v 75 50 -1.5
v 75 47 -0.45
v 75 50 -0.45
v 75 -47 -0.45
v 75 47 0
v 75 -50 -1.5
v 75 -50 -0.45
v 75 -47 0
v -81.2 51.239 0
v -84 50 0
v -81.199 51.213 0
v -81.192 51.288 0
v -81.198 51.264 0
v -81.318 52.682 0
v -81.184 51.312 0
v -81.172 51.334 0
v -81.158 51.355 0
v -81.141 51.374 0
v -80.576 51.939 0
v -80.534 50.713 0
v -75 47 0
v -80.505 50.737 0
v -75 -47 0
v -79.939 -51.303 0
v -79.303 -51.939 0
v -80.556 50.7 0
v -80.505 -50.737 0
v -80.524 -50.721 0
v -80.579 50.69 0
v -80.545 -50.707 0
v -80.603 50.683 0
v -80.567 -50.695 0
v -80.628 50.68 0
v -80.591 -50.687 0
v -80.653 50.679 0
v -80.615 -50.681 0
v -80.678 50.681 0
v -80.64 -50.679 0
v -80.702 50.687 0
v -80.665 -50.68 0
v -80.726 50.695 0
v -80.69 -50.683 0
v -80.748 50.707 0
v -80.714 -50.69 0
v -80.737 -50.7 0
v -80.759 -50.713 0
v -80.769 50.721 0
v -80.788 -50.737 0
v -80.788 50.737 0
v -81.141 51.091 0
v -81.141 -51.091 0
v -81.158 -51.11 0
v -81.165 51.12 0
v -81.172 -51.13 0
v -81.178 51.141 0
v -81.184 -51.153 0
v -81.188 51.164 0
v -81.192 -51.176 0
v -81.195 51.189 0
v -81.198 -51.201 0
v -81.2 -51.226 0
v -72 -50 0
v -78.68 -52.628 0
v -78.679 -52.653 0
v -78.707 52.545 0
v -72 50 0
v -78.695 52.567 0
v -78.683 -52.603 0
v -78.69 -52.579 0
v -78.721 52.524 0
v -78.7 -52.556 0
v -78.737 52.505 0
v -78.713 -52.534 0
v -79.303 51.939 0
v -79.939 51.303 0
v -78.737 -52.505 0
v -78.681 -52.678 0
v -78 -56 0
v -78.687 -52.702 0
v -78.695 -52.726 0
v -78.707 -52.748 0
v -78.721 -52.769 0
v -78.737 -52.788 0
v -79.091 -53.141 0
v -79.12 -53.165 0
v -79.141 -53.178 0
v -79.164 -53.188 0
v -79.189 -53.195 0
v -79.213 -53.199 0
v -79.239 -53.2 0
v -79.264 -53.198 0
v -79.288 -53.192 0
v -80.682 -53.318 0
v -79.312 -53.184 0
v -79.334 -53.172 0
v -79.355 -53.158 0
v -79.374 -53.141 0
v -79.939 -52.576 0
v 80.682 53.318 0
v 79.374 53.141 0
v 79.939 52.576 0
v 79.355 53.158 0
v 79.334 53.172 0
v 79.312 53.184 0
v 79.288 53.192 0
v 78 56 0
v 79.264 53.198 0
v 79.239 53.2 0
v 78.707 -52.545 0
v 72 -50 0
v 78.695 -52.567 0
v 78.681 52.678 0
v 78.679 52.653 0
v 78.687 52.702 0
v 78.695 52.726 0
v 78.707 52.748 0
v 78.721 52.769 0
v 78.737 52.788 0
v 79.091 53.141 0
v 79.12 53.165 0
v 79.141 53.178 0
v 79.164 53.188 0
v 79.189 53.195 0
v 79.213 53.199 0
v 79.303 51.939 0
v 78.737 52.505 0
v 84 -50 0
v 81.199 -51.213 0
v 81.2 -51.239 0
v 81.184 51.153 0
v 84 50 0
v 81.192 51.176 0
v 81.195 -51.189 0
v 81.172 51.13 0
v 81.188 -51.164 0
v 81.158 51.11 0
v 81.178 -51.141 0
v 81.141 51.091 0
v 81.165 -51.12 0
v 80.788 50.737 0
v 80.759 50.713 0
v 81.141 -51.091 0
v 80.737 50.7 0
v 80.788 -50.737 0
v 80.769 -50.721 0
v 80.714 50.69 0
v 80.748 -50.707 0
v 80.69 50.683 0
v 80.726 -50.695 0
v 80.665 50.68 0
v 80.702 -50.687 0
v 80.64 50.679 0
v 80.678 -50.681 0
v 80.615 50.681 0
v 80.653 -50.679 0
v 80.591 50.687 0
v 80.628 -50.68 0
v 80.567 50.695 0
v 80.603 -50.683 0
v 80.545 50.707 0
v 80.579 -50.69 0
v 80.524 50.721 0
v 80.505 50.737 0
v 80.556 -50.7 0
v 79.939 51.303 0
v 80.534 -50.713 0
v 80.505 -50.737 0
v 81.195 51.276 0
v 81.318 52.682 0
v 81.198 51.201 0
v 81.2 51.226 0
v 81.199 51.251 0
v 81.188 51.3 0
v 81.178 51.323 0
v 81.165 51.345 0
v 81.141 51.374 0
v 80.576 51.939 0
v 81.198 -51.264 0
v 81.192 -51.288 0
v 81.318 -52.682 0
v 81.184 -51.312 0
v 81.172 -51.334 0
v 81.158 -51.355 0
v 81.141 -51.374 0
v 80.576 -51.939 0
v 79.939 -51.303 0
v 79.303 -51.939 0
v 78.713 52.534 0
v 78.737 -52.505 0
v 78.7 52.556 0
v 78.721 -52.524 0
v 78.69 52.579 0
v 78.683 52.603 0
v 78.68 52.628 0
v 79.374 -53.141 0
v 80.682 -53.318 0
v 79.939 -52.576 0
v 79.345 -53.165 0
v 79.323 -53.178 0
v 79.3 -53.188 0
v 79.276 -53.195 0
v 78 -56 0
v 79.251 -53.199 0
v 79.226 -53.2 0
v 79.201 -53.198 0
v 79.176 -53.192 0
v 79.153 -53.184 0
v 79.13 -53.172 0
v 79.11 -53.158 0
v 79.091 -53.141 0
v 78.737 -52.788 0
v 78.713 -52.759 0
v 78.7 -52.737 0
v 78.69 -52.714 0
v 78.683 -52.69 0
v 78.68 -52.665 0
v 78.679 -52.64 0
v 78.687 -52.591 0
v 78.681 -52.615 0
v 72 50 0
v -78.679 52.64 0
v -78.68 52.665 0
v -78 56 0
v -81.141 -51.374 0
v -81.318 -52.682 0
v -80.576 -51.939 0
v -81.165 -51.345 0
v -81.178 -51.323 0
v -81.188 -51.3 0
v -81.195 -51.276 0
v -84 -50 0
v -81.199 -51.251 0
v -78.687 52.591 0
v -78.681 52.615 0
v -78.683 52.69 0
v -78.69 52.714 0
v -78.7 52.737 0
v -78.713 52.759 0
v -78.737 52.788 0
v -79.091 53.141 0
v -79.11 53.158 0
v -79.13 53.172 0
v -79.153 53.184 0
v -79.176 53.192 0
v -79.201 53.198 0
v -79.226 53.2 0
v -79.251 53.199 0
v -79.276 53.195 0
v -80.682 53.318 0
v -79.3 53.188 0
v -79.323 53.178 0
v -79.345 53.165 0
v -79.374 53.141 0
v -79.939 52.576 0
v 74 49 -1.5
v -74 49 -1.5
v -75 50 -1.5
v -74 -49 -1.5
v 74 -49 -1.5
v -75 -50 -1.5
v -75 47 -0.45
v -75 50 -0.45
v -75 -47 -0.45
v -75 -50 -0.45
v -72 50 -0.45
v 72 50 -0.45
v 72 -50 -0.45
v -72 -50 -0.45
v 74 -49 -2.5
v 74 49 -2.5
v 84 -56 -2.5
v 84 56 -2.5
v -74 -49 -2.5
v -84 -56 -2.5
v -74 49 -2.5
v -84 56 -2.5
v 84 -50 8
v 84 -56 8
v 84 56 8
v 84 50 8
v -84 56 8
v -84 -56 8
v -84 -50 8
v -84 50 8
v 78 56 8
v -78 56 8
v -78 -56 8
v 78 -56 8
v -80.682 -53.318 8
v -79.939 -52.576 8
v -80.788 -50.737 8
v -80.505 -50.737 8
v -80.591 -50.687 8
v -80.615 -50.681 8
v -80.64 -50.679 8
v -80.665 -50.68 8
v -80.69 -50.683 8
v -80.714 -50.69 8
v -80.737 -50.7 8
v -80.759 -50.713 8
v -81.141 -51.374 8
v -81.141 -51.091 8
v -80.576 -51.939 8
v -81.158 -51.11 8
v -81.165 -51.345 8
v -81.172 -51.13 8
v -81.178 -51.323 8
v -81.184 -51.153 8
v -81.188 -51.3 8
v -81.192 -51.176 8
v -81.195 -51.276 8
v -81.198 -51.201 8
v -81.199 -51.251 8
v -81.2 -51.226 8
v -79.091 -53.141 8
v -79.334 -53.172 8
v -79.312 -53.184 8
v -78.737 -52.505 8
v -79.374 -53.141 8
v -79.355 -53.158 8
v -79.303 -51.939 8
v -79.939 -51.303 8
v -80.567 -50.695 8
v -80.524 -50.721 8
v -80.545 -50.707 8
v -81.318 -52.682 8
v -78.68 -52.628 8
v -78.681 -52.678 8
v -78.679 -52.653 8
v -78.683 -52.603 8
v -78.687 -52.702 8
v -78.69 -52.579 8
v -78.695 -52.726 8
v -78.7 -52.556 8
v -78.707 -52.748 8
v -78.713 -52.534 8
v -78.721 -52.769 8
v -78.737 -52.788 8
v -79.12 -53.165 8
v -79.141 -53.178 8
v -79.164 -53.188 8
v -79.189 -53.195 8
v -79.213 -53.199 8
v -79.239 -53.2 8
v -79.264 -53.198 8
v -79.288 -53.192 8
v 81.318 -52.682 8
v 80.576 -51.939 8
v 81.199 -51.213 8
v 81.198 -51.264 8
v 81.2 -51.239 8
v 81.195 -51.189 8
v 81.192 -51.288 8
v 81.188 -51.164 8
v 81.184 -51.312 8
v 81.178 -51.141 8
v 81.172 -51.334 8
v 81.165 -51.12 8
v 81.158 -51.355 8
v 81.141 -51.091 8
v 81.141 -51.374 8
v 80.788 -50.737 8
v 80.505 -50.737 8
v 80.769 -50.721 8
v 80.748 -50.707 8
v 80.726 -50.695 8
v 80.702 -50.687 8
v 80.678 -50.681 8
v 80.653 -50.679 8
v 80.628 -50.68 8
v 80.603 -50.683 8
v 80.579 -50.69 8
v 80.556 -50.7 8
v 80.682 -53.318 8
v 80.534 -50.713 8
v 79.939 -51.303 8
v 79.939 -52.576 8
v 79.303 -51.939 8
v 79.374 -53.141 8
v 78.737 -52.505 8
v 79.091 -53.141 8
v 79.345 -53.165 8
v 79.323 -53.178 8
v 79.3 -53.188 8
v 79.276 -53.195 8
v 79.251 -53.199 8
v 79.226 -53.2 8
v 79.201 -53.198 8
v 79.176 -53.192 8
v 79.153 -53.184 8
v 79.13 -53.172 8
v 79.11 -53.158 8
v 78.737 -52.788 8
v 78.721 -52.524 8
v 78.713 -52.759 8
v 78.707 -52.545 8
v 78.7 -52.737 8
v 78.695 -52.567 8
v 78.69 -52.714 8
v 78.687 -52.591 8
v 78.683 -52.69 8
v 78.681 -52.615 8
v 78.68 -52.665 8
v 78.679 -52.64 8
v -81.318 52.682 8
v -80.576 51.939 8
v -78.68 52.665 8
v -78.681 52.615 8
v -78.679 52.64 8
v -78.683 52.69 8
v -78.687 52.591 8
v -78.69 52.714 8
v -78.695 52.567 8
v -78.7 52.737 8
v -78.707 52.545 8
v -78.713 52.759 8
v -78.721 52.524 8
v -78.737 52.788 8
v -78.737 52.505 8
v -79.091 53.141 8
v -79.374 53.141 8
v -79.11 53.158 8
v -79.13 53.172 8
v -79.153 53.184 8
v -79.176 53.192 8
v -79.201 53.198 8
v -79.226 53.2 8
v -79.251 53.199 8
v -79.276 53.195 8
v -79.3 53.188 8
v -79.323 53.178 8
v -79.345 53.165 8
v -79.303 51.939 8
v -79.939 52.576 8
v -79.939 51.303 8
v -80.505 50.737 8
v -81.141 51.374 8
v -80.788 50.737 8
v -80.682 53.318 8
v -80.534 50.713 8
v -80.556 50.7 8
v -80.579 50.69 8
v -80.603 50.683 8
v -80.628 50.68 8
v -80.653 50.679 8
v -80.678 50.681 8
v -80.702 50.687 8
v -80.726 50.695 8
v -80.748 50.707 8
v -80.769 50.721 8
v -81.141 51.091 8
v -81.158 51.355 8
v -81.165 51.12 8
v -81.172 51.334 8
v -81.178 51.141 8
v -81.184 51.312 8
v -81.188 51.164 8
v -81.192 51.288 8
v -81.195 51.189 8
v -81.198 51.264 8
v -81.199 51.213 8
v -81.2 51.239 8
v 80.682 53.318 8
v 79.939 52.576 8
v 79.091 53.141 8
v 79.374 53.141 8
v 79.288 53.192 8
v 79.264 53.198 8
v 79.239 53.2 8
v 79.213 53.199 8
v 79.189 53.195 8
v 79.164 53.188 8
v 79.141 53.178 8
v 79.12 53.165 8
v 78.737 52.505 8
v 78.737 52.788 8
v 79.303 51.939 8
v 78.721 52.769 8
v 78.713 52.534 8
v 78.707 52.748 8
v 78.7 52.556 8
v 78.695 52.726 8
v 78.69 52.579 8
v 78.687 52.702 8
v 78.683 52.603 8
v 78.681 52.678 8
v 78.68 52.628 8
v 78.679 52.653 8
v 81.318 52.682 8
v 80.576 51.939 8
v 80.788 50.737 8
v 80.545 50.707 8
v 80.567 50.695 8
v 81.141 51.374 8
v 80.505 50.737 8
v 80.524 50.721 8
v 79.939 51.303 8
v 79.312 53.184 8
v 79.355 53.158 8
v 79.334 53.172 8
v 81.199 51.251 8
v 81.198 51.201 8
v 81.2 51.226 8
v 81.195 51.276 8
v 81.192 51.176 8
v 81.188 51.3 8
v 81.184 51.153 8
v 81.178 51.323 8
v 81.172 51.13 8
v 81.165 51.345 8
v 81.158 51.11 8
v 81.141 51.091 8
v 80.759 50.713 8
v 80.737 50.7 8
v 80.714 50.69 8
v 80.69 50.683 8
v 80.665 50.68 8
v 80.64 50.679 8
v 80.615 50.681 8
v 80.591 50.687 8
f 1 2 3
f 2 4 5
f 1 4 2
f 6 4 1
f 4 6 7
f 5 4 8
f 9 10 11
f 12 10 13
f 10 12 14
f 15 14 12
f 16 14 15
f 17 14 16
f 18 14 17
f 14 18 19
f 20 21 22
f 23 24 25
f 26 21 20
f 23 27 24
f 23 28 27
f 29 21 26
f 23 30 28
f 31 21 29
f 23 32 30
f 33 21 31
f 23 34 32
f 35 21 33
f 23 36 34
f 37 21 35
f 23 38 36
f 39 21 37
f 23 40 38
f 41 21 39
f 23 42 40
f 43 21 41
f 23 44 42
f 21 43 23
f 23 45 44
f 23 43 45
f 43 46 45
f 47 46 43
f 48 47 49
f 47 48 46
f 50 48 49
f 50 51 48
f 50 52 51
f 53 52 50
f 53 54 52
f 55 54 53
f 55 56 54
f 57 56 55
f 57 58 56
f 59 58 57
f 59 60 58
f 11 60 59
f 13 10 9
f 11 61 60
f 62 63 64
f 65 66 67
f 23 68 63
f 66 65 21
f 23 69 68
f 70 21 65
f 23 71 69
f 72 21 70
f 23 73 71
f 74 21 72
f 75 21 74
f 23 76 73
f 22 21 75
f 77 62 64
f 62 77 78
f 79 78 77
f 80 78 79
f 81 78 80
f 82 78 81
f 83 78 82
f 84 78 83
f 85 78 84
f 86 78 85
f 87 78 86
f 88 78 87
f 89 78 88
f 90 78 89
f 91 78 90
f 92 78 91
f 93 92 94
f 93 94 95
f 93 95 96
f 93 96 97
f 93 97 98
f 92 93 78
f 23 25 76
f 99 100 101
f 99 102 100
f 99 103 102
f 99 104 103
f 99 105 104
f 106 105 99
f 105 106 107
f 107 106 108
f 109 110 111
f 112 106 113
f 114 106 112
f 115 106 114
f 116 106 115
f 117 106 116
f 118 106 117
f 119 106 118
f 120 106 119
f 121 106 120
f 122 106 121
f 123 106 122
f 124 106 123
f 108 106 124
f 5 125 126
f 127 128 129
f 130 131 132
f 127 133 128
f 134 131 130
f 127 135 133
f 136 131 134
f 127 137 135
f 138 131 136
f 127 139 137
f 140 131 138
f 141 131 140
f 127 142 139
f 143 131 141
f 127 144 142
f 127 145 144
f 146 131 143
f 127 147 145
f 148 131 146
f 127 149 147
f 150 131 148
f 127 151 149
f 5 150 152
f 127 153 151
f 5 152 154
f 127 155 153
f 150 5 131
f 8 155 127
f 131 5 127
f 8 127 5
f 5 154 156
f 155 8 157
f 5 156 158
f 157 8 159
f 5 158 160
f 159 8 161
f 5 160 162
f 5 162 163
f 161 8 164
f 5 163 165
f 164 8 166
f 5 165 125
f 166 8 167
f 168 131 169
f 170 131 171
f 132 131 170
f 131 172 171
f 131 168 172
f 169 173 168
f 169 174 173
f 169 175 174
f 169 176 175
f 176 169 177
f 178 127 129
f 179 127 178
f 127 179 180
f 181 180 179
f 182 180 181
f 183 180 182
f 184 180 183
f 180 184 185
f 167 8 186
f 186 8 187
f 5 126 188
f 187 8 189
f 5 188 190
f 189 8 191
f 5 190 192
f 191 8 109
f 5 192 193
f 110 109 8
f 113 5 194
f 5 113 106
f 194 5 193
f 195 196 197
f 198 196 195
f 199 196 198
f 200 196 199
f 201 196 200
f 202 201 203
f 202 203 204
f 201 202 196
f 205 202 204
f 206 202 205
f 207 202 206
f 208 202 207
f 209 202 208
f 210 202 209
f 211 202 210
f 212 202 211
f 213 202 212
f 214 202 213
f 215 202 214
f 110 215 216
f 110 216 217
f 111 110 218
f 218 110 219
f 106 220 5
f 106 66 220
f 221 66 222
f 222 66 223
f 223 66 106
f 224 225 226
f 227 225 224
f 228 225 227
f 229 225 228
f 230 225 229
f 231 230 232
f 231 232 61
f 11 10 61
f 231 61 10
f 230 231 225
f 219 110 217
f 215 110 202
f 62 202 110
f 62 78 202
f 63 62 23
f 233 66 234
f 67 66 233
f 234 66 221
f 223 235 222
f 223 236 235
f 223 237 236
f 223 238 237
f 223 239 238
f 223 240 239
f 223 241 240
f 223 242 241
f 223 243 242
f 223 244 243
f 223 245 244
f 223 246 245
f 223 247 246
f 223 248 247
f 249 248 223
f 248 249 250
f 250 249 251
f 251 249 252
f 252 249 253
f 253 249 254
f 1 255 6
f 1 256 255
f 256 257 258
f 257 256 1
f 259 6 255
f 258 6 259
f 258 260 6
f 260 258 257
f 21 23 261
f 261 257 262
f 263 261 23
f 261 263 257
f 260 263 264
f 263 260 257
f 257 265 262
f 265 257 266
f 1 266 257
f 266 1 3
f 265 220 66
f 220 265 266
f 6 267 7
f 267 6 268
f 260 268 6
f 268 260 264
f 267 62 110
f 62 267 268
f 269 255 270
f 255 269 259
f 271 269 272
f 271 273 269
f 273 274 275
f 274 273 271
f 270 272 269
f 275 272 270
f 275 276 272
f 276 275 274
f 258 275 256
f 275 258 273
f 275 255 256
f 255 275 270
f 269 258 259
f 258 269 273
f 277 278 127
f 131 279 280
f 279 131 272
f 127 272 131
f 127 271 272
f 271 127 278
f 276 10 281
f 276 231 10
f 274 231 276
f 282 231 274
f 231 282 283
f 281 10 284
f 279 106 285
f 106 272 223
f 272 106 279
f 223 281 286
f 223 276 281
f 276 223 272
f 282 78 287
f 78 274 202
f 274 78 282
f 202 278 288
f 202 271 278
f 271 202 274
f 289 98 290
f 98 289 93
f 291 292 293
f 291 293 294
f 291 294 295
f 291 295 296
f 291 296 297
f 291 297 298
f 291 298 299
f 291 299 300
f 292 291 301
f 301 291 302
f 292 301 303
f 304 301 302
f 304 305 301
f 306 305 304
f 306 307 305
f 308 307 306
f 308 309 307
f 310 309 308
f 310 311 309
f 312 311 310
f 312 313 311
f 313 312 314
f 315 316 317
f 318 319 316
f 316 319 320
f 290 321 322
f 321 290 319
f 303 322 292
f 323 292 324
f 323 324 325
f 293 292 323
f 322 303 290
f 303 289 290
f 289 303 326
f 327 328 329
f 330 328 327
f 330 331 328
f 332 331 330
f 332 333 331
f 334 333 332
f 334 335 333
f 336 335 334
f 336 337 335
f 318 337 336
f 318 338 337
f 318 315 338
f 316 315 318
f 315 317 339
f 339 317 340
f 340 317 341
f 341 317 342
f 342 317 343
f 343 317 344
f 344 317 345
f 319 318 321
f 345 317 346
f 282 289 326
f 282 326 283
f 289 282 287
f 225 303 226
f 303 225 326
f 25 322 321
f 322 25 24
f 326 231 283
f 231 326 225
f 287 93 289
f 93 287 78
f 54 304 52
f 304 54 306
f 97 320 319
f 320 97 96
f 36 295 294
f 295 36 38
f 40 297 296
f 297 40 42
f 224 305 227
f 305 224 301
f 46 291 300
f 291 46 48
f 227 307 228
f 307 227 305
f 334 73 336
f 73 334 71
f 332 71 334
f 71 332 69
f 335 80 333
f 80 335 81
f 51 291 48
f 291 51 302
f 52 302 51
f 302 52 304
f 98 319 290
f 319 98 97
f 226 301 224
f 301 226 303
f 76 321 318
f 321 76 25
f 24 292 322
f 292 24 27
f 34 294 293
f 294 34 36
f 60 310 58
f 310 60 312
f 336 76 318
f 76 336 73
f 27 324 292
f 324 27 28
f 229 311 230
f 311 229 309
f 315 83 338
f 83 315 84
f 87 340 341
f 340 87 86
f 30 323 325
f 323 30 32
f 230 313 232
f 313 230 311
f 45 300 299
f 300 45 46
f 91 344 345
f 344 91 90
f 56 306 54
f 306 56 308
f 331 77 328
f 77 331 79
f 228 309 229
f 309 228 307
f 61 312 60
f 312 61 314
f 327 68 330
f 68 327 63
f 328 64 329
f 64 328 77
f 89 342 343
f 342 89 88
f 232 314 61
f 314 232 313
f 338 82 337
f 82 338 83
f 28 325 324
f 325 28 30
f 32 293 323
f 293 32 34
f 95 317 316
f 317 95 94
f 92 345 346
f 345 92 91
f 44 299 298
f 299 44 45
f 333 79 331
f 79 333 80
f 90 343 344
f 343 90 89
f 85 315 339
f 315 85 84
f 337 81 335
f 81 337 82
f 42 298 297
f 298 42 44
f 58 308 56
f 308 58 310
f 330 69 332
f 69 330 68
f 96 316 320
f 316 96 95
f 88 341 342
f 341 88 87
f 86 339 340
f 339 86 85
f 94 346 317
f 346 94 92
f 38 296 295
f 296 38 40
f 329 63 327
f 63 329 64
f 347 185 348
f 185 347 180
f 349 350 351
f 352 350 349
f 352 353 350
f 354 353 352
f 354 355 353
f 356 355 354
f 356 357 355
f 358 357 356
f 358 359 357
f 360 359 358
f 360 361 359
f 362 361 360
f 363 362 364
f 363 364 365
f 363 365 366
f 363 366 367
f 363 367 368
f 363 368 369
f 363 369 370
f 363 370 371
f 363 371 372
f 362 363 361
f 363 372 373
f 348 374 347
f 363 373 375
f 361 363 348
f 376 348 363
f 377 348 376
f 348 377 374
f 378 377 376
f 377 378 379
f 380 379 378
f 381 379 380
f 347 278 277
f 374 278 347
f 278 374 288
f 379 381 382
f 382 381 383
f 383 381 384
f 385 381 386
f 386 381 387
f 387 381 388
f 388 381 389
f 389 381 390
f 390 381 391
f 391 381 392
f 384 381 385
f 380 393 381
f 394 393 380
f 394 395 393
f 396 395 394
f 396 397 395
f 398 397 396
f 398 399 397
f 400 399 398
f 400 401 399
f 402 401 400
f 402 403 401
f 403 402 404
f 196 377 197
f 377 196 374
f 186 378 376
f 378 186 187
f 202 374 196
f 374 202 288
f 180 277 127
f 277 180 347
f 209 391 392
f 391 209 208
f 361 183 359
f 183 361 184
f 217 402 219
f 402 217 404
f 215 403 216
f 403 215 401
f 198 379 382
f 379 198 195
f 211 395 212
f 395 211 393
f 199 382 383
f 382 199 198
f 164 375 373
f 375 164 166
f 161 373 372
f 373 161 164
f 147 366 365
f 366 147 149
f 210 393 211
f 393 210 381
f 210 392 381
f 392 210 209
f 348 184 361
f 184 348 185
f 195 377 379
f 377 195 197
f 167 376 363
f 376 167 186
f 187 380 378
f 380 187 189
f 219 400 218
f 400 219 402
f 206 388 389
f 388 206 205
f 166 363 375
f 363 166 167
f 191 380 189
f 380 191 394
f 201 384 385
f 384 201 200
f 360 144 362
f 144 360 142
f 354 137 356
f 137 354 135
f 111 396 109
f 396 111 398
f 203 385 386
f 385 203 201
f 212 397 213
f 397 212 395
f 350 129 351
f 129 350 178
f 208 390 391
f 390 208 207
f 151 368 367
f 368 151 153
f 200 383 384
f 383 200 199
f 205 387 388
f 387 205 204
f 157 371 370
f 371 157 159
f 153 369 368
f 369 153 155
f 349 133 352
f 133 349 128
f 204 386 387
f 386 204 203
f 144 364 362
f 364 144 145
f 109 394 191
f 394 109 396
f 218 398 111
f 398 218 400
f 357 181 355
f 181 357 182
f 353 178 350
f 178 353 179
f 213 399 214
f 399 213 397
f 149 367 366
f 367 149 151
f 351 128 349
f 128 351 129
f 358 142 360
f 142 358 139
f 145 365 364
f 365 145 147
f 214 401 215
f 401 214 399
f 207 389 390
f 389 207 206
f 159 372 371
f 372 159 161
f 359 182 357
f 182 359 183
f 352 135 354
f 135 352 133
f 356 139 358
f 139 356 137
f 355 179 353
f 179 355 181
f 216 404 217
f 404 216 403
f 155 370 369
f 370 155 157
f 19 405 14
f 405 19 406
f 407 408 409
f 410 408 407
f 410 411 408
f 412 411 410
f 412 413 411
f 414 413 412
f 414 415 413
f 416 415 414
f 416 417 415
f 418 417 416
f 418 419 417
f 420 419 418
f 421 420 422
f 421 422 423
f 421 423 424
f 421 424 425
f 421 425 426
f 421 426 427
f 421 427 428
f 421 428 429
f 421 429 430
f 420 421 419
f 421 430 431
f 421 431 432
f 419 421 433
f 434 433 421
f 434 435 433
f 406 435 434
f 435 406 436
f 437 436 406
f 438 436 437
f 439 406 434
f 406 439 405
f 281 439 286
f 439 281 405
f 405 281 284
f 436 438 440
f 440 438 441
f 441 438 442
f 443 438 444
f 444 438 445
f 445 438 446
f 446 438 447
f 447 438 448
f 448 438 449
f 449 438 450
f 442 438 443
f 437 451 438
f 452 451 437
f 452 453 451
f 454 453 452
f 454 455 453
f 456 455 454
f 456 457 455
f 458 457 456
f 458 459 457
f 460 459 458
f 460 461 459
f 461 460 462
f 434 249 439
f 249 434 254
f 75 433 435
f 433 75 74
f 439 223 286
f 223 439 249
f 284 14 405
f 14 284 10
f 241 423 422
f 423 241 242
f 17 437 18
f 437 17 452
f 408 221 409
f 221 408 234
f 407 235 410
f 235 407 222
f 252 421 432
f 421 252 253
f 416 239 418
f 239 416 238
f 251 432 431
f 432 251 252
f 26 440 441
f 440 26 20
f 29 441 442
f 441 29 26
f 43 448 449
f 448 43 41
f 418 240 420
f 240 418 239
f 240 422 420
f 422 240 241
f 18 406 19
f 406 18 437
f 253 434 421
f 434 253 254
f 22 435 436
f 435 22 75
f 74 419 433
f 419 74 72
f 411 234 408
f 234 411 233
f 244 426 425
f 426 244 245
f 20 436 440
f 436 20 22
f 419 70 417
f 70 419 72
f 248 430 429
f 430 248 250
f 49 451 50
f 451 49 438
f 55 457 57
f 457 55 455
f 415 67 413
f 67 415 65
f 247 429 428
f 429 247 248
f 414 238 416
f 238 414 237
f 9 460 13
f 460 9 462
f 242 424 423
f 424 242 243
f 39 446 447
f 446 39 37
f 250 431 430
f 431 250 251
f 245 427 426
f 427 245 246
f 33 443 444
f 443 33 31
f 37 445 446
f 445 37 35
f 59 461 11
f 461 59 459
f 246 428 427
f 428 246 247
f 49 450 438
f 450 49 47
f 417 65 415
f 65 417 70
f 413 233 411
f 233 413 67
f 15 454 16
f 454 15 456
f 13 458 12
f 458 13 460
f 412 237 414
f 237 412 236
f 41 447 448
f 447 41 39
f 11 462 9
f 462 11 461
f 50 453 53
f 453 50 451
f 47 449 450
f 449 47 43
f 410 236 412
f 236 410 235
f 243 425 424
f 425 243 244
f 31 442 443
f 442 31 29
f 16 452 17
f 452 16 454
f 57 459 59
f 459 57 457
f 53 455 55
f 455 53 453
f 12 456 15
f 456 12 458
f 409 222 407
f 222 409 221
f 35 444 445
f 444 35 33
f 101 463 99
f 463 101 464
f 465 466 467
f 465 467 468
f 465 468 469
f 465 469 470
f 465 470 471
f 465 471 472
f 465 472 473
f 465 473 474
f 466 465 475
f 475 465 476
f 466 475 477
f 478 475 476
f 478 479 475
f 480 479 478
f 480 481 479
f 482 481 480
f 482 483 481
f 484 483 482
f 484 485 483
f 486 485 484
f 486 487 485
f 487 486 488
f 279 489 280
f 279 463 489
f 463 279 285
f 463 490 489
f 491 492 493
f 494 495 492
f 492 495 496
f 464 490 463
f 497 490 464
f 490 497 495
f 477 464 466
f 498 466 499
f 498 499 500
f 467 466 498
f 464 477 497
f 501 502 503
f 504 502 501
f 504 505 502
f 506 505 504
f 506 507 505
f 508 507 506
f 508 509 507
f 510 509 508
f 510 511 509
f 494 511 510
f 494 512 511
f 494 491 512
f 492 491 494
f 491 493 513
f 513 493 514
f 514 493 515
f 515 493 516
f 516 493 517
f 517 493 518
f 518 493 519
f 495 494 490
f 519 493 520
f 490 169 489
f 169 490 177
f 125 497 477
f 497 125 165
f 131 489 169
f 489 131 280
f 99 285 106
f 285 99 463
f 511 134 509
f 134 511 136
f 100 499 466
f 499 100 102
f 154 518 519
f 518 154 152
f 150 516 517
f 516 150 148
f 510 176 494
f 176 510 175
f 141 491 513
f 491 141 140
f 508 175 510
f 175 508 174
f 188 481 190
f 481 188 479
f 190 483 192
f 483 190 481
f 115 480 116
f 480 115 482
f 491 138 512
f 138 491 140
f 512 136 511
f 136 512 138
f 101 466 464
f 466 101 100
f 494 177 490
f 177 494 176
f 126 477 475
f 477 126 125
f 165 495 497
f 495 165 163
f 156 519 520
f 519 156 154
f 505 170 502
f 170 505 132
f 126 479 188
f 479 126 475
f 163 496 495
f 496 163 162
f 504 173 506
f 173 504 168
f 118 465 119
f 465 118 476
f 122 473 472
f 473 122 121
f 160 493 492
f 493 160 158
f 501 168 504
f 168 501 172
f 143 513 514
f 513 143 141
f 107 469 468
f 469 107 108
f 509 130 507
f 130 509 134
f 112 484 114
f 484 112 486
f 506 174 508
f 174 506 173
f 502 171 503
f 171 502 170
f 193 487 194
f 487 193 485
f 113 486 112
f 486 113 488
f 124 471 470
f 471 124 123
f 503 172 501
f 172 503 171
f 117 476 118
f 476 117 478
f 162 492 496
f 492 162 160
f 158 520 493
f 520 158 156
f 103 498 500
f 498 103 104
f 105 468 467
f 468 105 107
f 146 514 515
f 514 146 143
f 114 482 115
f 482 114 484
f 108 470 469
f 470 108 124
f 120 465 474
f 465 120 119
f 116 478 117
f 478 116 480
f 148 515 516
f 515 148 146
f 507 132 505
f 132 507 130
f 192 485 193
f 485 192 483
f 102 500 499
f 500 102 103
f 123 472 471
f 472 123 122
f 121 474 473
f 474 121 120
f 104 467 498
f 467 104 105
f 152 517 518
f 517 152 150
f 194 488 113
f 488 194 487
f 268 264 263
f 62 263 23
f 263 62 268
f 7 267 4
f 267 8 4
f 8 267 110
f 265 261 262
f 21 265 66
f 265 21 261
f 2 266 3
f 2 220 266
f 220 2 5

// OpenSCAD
dimension_mode = "grid"; // "grid" (28mm OpenGrid units) or "custom" (explicit mm)
grid_width = 6;
grid_height = 4;
custom_width = 168;
custom_height = 112;

width = (dimension_mode == "custom") ? custom_width : (grid_width * 28);
height = (dimension_mode == "custom") ? custom_height : (grid_height * 28);
base_thickness = 1;
arcylic_height = 100;
arcylic_width = 150;
arcylic_thickness = 1;
connector_offset = 0.05;
connector_depth = 8;
connector_fillet = 0.2;

$fn = 50;

module connector() {
    linear_extrude(connector_depth) {
        polygon(points = [[0,0], [6,0], [0,6]]);
    }
    translate([3, 3, 0])
        rotate([0, 0, -45])
        union() {
            translate([-0.5 + connector_offset, 0, 0])
                cube([1 - (connector_offset * 2), 2 - connector_offset, connector_depth]);
            linear_extrude(connector_depth) {
                translate([-1.5 + connector_offset + connector_fillet, 1 + connector_offset + connector_fillet, 0])
                    offset(connector_fillet) {
                        square([3 - (connector_offset * 2) - (connector_fillet * 2), 1 - (connector_offset * 2) - (connector_fillet * 2)]);
                    }
            }
        }
}

module corner_holder() {
    translate([0, 0, -0.45])
        linear_extrude(0.45) {
            polygon(points = [[0,0], [3,0], [0,3]]);
        }
}
    
// Shell
union() {
    difference() {
        translate([0, 0, (-base_thickness - arcylic_thickness - 0.5) / 2])
            cube([width, height, base_thickness + arcylic_thickness + 0.5], true);
        union() {
            translate([0, 0, (-arcylic_thickness - 0.5) / 2])
                cube([arcylic_width, arcylic_height, arcylic_thickness + 0.5], true);
            translate([0, 0, (-base_thickness / 2) - arcylic_thickness - 0.5])
                cube([arcylic_width - 2, arcylic_height - 2, base_thickness], true);
        }
    }

    translate([-width / 2, -height / 2, 0])
        connector();
    translate([width / 2, -height / 2, 0])
        rotate([0, 0, 90])
        connector();
    translate([-width / 2, height / 2, 0])
        rotate([0, 0, -90])
        connector();
    translate([width / 2, height / 2, 0])
        rotate([0, 0, 180])
        connector();
    
    translate([-arcylic_width / 2, -arcylic_height / 2, 0])
        corner_holder();
    translate([arcylic_width / 2, -arcylic_height / 2, 0])
        rotate([0, 0, 90])
        corner_holder();
    translate([-arcylic_width / 2, arcylic_height / 2, 0])
        rotate([0, 0, -90])
        corner_holder();
    translate([arcylic_width / 2, arcylic_height / 2, 0])
        rotate([0, 0, 180])
        corner_holder();
}   
